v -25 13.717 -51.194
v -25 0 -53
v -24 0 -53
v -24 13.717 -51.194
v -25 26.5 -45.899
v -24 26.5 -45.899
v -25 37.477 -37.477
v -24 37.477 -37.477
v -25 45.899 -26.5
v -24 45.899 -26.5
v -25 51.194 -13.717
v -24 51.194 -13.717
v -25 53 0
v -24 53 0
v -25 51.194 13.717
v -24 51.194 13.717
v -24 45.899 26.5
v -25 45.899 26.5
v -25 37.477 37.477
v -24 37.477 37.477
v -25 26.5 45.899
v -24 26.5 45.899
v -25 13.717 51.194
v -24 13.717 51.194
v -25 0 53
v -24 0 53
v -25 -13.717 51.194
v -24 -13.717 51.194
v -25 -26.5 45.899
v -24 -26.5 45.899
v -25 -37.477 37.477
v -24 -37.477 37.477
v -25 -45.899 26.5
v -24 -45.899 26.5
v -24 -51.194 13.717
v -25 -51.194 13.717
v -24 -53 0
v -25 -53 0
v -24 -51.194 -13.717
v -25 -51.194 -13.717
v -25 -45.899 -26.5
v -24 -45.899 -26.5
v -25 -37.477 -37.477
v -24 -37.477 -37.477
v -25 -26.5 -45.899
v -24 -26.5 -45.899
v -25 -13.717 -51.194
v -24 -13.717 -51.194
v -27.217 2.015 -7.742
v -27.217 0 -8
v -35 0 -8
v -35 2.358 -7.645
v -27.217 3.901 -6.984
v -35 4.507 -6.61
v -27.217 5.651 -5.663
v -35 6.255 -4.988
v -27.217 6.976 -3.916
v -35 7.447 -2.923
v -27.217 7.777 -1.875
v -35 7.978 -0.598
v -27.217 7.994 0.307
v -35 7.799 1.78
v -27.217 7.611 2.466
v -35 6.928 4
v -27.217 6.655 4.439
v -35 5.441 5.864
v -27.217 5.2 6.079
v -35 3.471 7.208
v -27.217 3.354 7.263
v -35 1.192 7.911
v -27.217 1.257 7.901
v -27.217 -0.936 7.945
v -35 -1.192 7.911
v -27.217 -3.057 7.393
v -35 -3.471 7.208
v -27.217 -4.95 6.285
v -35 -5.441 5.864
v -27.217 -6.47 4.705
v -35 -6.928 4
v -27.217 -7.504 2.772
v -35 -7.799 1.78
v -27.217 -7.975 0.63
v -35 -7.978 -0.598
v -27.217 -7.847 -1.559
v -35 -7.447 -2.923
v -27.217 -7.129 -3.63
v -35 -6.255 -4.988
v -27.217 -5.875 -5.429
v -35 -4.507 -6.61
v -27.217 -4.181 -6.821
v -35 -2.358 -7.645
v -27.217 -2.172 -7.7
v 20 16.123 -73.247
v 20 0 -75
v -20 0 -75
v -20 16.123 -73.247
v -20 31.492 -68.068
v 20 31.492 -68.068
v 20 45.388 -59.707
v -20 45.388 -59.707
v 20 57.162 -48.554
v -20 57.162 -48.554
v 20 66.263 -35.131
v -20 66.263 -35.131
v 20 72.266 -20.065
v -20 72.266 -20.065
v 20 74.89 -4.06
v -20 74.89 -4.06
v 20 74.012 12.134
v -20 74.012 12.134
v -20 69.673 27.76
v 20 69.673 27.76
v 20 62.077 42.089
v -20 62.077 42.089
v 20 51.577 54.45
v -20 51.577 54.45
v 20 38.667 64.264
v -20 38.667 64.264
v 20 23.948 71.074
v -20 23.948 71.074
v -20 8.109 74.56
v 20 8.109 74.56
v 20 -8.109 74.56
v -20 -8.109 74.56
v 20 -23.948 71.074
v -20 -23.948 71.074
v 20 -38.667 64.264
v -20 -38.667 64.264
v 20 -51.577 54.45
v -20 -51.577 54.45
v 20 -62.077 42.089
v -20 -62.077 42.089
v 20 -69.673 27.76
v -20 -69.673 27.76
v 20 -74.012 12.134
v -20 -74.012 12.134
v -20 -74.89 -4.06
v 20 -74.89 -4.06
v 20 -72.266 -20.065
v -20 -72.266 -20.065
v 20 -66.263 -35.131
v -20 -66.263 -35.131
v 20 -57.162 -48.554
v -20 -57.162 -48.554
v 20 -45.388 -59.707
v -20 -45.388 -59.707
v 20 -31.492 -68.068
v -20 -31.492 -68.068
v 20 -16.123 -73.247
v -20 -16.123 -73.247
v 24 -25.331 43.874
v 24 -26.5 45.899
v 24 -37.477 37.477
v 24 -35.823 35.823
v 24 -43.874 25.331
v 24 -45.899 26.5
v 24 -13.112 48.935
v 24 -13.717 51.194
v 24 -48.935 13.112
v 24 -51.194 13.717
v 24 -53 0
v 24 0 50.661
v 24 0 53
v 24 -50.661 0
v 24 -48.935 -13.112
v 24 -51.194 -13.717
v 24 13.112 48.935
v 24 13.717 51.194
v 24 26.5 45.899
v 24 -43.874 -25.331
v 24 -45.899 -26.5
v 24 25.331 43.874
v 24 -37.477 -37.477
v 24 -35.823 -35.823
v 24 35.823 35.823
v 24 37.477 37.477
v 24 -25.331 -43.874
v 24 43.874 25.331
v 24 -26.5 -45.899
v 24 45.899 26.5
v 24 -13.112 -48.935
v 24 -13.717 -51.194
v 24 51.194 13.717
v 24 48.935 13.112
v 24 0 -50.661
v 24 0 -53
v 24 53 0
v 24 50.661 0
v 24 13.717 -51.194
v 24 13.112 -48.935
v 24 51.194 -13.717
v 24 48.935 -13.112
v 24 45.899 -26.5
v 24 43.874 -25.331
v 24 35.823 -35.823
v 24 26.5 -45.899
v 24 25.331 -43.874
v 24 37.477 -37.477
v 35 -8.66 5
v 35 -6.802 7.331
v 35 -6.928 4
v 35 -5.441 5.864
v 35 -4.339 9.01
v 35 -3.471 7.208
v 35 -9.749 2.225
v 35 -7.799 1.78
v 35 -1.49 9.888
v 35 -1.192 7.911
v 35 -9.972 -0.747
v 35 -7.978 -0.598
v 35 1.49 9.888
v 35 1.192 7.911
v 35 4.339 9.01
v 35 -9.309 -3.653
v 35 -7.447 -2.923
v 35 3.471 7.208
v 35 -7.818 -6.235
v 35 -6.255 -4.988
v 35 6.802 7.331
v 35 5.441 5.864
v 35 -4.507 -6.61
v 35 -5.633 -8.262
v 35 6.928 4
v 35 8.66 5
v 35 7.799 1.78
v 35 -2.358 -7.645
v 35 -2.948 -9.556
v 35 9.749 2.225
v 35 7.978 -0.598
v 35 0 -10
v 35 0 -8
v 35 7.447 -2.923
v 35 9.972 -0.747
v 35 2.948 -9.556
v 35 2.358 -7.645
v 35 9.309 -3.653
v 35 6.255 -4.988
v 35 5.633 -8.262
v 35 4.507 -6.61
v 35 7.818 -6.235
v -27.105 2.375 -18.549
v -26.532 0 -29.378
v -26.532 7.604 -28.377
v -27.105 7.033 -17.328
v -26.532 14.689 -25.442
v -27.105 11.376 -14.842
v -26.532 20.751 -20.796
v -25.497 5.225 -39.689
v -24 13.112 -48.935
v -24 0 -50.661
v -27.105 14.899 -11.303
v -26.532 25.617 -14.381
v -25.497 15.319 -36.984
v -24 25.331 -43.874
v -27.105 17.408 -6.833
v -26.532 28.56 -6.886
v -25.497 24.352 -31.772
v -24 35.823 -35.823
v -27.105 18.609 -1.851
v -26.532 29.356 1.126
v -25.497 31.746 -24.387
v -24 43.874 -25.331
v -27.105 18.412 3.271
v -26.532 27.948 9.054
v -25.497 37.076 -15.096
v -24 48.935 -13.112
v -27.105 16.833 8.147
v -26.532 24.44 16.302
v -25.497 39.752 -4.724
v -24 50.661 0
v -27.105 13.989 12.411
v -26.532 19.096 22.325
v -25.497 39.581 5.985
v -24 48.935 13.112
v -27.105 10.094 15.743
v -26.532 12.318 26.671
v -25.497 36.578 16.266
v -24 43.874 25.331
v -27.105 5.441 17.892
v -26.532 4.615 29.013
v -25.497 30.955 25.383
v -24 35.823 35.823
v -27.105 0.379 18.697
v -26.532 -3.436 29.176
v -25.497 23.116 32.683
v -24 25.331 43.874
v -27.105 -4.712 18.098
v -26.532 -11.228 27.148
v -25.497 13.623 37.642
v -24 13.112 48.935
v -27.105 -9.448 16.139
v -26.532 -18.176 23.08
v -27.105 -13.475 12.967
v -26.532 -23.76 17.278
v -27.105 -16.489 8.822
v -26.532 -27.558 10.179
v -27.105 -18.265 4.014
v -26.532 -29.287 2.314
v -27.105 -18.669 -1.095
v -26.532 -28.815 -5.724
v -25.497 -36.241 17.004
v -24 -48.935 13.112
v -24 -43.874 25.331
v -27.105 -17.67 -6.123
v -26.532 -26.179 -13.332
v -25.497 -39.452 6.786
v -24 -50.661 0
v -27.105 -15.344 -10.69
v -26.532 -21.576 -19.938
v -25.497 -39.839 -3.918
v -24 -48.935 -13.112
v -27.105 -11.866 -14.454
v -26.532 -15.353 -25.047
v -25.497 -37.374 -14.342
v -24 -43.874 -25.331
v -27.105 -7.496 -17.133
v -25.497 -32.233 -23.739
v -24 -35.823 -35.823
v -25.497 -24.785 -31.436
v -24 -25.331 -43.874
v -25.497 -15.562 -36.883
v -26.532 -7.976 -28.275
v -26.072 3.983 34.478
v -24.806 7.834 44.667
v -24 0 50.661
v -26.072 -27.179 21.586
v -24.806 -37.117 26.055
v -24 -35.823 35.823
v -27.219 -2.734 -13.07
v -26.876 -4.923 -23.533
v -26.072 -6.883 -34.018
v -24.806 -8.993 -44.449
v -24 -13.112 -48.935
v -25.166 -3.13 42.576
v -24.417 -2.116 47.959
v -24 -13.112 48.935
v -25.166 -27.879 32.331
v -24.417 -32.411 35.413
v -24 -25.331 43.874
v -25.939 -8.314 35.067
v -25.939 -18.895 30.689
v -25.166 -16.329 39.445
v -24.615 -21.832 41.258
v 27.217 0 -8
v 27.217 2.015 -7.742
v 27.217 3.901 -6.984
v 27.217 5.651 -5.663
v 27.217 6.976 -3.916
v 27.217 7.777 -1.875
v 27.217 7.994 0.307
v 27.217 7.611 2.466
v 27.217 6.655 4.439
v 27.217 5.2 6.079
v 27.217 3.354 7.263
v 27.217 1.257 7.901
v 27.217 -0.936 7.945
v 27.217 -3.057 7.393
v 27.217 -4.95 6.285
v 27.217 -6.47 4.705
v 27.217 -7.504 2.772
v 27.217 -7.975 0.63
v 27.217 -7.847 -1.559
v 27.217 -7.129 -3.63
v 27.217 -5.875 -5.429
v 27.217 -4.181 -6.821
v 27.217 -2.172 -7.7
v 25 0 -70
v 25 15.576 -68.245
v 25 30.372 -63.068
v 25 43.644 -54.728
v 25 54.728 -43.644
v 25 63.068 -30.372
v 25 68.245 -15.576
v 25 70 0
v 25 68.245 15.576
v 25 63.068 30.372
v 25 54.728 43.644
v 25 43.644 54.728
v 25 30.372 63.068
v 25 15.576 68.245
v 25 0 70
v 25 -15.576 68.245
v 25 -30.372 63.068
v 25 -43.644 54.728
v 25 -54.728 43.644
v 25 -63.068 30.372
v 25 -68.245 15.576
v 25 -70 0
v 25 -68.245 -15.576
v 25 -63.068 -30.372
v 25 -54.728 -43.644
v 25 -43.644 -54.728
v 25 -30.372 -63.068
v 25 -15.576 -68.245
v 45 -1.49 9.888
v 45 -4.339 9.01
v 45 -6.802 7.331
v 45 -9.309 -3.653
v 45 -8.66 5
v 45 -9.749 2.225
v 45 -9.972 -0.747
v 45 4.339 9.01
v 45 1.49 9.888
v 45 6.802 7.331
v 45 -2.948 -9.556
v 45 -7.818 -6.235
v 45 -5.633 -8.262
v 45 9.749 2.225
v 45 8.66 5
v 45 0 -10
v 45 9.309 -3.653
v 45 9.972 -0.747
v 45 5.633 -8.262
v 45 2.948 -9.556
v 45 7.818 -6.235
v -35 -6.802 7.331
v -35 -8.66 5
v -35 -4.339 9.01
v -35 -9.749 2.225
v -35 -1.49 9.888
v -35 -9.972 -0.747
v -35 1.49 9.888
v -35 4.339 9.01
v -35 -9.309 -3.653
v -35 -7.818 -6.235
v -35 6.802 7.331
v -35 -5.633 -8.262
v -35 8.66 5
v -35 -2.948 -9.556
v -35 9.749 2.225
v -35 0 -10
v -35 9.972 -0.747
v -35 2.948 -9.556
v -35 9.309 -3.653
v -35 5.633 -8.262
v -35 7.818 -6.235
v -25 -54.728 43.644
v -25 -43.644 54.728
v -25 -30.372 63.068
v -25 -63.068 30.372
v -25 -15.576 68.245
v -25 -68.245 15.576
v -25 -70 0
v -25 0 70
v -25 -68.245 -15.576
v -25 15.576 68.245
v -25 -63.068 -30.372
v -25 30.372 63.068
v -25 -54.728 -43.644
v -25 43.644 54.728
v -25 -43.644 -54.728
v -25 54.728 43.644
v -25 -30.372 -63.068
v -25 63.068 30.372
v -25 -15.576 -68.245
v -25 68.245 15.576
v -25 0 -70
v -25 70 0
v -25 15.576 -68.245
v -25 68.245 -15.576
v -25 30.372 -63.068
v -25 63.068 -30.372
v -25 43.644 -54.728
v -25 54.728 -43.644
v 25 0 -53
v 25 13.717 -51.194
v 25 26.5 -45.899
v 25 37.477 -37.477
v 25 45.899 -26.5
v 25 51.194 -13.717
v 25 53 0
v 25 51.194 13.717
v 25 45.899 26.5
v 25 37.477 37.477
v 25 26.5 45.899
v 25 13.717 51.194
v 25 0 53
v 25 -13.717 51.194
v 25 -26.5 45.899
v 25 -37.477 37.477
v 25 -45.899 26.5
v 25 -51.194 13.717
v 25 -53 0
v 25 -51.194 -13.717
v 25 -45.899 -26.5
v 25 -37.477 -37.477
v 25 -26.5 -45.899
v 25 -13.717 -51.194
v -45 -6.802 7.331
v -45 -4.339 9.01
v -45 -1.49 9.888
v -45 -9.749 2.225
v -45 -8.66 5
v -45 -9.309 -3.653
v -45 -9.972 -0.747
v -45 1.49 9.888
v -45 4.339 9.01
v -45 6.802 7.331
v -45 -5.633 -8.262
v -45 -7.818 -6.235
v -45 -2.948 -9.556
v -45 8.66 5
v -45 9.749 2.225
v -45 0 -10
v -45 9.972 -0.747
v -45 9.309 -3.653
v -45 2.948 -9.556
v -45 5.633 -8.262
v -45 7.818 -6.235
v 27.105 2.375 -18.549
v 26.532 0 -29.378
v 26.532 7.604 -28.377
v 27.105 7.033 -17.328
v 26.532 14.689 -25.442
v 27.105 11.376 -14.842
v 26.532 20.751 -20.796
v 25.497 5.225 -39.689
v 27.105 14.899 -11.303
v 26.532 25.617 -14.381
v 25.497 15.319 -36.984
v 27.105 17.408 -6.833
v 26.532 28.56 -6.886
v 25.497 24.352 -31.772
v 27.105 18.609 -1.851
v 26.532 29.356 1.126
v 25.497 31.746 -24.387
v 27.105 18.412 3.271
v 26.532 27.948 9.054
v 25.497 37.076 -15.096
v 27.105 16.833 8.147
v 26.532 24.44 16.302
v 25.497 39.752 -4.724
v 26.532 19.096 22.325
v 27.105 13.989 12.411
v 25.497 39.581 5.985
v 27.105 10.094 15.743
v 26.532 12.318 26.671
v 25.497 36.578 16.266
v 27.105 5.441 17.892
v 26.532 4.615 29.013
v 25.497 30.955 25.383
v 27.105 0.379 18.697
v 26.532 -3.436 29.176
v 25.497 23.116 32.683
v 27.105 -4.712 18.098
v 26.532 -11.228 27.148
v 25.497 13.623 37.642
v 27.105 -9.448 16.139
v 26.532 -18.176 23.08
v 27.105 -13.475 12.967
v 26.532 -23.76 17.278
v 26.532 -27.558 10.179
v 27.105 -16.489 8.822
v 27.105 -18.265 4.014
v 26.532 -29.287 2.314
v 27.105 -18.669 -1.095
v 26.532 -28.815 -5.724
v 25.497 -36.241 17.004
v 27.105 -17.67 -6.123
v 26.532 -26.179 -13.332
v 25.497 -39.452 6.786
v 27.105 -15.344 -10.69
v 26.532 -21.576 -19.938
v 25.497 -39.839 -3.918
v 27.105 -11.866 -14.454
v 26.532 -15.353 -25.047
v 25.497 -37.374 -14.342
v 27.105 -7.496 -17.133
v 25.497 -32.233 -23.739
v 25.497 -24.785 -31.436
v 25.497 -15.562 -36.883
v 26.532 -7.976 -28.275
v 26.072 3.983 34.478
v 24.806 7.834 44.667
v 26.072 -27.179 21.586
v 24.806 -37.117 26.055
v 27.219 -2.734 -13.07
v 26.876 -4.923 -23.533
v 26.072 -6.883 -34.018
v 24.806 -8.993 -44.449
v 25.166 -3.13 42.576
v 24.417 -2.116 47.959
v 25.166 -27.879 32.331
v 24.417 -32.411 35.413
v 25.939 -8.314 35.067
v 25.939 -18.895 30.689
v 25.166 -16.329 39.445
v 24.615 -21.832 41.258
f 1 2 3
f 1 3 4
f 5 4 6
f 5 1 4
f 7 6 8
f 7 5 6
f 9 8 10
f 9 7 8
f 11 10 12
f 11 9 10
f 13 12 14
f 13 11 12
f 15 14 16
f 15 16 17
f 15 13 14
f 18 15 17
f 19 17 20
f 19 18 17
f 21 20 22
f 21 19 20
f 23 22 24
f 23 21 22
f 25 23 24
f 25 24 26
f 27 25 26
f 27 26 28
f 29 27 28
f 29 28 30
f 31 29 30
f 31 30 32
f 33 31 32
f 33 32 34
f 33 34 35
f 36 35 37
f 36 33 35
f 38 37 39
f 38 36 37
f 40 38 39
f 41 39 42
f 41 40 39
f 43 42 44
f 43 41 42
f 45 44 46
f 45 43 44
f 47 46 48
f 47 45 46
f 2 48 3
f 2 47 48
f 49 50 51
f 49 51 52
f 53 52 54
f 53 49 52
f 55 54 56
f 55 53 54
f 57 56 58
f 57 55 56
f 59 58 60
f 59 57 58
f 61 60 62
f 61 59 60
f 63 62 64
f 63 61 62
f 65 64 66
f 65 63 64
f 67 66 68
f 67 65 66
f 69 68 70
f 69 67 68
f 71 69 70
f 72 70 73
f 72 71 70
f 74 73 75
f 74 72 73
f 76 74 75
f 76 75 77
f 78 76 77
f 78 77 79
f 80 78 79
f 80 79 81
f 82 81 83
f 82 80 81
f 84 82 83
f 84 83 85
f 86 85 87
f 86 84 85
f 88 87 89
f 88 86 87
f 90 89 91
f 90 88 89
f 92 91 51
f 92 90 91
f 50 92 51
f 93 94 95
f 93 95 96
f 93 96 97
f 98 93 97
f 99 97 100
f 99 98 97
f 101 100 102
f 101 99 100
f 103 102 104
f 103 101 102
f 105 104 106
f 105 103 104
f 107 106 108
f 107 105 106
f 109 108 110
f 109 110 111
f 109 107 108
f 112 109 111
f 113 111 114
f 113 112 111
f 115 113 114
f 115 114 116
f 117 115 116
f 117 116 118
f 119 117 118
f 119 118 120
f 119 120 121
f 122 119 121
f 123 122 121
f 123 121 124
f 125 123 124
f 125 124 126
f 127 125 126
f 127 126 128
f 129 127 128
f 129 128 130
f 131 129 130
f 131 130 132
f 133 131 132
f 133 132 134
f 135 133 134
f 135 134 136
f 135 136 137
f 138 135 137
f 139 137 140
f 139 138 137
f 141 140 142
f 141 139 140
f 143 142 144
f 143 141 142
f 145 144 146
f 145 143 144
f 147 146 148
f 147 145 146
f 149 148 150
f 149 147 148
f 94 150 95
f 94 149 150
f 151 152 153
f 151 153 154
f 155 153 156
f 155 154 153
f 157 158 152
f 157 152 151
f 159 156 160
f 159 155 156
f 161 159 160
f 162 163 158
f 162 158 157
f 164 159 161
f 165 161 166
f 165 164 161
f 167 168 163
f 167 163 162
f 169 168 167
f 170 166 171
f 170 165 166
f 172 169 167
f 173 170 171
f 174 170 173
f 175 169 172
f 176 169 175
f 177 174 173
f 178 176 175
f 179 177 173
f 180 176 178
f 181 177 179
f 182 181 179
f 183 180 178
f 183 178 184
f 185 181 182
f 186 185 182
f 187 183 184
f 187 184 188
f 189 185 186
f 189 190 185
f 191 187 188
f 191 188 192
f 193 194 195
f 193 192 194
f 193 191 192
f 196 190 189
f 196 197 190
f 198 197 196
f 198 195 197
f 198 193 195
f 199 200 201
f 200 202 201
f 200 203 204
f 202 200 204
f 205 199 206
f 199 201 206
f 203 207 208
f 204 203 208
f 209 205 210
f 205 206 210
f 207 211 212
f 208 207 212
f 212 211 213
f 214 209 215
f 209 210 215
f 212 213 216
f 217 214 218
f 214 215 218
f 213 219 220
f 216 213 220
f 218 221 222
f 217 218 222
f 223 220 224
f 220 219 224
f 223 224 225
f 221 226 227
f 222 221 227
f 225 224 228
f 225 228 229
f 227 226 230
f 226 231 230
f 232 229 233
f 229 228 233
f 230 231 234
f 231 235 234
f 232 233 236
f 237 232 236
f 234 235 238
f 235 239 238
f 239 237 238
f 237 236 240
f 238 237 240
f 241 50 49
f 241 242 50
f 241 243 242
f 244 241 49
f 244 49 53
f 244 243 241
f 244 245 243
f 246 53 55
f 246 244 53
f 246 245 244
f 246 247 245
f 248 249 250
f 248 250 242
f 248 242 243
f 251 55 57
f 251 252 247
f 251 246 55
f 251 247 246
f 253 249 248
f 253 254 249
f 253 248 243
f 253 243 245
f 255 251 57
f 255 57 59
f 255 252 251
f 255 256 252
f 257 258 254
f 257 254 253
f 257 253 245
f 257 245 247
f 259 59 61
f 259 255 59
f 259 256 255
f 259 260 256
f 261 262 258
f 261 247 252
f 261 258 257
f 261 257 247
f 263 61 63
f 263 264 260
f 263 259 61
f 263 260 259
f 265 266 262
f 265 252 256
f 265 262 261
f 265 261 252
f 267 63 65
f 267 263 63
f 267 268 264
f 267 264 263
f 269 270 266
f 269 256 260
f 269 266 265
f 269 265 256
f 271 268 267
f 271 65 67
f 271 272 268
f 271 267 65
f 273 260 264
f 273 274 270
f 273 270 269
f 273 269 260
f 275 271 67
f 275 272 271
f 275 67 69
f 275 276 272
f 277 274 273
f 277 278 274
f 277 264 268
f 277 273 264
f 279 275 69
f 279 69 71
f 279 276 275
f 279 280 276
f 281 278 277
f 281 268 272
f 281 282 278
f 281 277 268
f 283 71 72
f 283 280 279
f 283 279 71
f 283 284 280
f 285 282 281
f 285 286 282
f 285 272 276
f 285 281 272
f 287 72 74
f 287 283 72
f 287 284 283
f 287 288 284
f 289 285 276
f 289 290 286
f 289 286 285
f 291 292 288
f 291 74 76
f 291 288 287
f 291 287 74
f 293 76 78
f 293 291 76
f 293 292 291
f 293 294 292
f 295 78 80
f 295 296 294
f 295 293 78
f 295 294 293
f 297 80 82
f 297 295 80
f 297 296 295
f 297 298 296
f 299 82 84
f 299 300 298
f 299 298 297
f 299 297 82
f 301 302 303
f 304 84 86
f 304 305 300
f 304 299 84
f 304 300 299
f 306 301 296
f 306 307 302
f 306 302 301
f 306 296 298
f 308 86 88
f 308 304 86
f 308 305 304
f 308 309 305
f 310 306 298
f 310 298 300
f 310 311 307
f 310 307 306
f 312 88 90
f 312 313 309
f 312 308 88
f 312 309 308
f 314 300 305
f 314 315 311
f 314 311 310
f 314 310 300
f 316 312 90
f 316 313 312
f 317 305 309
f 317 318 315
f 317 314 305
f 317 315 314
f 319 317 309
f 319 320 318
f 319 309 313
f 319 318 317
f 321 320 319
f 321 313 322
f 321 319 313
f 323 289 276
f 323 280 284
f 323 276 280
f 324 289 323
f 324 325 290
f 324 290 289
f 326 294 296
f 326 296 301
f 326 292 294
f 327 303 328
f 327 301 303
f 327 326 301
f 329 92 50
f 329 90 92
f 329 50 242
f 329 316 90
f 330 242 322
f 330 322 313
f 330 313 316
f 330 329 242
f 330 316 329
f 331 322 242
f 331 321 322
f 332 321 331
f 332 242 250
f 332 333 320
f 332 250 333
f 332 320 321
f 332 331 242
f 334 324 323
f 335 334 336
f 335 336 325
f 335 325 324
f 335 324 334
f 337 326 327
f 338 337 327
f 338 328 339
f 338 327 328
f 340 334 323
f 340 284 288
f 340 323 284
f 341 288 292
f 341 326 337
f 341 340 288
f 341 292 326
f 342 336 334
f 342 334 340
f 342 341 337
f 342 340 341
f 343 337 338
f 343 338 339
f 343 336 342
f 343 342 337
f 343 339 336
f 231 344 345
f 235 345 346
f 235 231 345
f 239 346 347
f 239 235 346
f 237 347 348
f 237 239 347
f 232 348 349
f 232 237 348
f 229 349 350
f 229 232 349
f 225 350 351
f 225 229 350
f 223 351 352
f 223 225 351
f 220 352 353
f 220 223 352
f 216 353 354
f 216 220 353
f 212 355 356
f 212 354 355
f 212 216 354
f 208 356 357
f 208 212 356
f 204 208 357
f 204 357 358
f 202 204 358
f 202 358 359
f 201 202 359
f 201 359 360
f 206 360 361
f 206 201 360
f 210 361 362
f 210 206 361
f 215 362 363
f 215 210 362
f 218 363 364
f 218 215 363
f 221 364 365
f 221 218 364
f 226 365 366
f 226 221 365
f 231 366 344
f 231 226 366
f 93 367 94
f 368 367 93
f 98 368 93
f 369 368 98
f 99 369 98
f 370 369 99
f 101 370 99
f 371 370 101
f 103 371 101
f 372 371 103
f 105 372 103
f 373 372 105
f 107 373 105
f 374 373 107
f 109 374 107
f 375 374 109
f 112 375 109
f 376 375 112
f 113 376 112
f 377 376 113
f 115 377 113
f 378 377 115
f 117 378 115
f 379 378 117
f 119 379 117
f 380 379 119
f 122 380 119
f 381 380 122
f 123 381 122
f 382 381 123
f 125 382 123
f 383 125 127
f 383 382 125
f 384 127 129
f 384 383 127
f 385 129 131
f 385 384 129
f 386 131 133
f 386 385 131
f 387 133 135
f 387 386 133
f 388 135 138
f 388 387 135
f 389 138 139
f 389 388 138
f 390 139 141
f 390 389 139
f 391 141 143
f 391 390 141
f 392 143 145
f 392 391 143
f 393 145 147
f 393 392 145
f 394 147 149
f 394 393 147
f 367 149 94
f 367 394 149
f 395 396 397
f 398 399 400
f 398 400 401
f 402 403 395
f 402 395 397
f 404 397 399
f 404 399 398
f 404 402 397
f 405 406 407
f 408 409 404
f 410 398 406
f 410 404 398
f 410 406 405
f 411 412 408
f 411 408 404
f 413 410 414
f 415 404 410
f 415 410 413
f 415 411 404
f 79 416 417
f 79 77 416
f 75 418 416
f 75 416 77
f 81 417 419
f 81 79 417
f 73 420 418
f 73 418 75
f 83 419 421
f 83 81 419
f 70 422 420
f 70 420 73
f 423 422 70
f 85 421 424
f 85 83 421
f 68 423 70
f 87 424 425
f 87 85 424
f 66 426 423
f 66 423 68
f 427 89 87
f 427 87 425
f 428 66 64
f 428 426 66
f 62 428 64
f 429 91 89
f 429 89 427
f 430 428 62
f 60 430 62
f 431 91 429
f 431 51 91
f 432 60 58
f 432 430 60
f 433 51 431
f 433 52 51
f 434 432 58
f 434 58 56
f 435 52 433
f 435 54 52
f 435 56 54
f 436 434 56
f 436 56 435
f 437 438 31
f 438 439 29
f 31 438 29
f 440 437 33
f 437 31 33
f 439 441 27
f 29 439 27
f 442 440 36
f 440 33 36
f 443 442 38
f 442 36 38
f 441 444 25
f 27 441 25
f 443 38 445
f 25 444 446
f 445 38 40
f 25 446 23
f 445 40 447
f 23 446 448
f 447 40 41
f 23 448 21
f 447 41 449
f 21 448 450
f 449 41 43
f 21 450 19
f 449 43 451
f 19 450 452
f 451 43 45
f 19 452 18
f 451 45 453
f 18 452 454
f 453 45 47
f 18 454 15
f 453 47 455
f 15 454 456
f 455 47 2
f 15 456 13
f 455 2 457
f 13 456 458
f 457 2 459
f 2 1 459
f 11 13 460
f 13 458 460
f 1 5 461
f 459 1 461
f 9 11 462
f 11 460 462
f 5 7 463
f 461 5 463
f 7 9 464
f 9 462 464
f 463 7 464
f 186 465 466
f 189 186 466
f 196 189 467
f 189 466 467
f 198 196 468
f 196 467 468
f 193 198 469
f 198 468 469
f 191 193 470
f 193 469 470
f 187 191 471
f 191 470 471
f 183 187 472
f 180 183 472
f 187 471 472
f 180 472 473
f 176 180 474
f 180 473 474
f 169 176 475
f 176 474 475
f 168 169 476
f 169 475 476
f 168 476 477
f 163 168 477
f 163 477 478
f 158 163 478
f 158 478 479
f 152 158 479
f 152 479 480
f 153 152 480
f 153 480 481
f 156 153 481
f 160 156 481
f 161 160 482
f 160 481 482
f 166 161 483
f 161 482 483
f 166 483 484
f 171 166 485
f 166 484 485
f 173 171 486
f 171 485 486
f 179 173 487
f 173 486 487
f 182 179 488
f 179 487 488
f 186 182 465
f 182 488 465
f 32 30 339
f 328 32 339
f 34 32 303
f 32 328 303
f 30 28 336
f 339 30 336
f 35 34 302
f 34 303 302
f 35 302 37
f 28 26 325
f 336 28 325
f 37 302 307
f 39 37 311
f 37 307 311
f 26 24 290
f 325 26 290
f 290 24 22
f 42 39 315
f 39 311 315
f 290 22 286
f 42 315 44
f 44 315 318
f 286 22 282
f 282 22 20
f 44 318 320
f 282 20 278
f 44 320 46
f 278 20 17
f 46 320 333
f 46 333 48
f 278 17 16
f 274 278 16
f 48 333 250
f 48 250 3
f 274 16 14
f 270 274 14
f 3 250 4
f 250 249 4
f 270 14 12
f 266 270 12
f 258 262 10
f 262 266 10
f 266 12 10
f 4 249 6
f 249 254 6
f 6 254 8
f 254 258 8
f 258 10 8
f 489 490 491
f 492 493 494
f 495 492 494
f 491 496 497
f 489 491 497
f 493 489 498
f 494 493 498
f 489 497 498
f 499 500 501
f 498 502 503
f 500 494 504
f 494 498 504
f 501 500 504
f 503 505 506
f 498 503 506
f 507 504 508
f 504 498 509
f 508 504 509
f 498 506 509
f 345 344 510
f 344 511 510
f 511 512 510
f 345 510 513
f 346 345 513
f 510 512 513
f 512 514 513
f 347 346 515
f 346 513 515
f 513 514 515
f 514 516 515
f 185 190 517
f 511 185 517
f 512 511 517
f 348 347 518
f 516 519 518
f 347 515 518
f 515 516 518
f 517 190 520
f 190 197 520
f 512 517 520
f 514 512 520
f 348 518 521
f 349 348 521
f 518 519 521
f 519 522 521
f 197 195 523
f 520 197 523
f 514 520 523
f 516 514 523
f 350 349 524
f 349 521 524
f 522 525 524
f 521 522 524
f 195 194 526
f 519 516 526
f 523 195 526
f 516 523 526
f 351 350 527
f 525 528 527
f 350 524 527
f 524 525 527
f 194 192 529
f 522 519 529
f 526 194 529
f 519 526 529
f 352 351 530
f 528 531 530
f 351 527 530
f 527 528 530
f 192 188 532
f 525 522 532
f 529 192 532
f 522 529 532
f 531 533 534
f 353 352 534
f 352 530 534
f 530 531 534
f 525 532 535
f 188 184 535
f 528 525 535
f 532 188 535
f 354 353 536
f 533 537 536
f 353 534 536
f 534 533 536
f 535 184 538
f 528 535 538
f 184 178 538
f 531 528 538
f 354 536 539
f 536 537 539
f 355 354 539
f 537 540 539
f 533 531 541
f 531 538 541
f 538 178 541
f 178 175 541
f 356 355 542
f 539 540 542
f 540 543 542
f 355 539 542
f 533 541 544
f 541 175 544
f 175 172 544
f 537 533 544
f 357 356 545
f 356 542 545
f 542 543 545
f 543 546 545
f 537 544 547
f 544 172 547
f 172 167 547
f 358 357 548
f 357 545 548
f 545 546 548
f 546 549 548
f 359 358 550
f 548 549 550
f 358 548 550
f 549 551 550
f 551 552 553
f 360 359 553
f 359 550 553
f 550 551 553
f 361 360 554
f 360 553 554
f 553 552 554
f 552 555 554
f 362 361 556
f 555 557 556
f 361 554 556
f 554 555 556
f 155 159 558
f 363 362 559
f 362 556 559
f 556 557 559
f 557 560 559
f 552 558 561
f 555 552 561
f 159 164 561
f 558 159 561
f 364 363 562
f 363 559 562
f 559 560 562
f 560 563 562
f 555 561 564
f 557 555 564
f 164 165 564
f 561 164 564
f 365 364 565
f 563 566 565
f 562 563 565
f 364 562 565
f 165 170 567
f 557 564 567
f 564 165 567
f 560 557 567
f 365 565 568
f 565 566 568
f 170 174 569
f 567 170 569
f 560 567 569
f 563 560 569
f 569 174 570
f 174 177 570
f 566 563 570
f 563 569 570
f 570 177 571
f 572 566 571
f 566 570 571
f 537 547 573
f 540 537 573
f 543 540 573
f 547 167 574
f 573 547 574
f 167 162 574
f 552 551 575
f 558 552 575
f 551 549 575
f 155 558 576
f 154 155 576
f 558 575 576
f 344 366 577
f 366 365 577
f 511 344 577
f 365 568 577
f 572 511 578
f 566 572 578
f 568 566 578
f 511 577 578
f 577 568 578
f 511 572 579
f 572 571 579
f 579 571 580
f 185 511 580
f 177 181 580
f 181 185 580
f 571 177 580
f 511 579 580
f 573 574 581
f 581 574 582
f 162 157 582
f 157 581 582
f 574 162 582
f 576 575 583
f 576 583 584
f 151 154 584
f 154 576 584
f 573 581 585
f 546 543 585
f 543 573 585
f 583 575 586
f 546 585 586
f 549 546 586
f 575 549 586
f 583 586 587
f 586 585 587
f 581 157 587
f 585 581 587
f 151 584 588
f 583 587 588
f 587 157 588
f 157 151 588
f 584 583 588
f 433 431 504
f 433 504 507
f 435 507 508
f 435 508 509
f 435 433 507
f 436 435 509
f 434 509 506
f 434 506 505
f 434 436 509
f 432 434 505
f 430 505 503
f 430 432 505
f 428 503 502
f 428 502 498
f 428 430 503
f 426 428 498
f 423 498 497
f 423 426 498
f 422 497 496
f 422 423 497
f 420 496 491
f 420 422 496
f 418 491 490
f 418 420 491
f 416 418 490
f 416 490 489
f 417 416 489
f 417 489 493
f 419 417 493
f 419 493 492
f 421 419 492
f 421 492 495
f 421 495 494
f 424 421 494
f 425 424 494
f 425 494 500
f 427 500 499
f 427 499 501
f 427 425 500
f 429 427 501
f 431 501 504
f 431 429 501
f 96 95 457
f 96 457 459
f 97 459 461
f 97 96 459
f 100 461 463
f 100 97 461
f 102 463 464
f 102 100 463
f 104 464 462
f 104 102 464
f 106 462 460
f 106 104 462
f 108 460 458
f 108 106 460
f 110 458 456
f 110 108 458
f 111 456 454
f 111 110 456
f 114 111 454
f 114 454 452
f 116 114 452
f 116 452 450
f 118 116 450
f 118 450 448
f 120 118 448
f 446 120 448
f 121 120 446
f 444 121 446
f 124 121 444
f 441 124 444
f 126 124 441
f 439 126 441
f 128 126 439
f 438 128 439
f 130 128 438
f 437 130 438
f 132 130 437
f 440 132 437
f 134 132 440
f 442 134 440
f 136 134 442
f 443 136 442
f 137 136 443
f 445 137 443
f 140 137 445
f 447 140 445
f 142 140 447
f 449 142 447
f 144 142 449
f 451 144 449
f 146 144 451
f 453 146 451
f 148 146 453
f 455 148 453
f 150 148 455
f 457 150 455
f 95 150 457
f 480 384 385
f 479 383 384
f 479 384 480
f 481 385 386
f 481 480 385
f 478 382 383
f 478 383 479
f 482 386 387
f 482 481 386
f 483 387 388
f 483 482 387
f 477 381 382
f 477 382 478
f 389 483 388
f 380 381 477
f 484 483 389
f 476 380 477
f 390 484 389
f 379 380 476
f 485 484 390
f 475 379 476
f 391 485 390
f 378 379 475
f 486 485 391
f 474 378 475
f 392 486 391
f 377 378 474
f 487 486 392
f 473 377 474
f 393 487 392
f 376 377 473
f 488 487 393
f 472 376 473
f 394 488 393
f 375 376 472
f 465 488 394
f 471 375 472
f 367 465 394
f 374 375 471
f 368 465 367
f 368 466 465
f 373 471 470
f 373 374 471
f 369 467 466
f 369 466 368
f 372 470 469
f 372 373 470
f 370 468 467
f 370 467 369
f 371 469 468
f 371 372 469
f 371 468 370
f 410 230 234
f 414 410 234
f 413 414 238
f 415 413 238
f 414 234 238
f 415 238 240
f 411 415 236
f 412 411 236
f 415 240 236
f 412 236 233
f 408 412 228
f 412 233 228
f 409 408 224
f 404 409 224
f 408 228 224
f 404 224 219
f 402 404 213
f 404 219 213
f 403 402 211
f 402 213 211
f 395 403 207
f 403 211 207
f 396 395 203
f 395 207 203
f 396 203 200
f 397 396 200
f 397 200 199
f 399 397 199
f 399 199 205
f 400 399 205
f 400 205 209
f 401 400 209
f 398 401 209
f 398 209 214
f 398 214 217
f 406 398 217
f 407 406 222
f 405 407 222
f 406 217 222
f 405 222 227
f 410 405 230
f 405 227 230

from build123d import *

# Parameters (mm, degrees)
SKETCH1_R           = 75
BOSS_EXTRUDE1_DEPTH = 25
SKETCH2_R           = 8
BOSS_EXTRUDE2_DEPTH = 35
SKETCH3_R           = 10
BOSS_EXTRUDE3_DEPTH = 10
CHAMFER1_SIZE       = 5
SKETCH4_R           = 53
SKETCH4_R_2         = 8
CUT_EXTRUDE1_DEPTH  = 1


with BuildPart() as part:
    # Sketch1 → Boss-Extrude1 (new body, symmetric)
    with BuildSketch(Plane(origin=(0, 0, 0), x_dir=(0, 0, -1), z_dir=(1, 0, 0))):
        Circle(SKETCH1_R)
    extrude(amount=BOSS_EXTRUDE1_DEPTH, both=True)

    # Sketch2 → Boss-Extrude2 (add, symmetric)
    with BuildSketch(Plane(origin=(0, 0, 0), x_dir=(0, 0, -1), z_dir=(1, 0, 0))):
        Circle(SKETCH2_R)
    extrude(amount=BOSS_EXTRUDE2_DEPTH, both=True)

    # Sketch3 → Boss-Extrude3 (add)
    with BuildSketch(Plane(origin=(35, 0, 0), x_dir=(0, 0, -1), z_dir=(1, 0, 0))):
        Circle(SKETCH3_R)
    boss_extrude3 = extrude(amount=BOSS_EXTRUDE3_DEPTH)

    # Mirror1: Boss-Extrude3 across plane
    add(boss_extrude3.mirror(Plane(origin=(0, 0, 0), x_dir=(0, 0, 1), z_dir=(1, 0, 0))))

    # Chamfer1
    chamfer1_edges = [part.edges().sort_by_distance(p)[0] for p in [
        (-25, 0, 75),
        (25, 0, 75),
    ]]
    chamfer(chamfer1_edges, length=CHAMFER1_SIZE)

    # Sketch4 → Cut-Extrude1 (cut)
    with BuildSketch(Plane(origin=(25, 0, 0), x_dir=(0, 0, -1), z_dir=(1, 0, 0))):
        Circle(SKETCH4_R)
        Circle(SKETCH4_R_2, mode=Mode.SUBTRACT)
    cut_extrude1 = extrude(amount=-CUT_EXTRUDE1_DEPTH, mode=Mode.SUBTRACT)

    # Mirror2: Cut-Extrude1 across plane
    add(cut_extrude1.mirror(Plane(origin=(0, 0, 0), x_dir=(0, 0, 1), z_dir=(1, 0, 0))), mode=Mode.SUBTRACT)

    # Sketch5 → Revolve1 (revolve)
    with BuildSketch(Plane(origin=(0, 0, 0), x_dir=(1, 0, 0), z_dir=(0, 1, 0))):
        with BuildLine():
            Line((24, 0), (24, 50.661166178))
            add(Edge.make_bspline(
                [(27, 0), (28.099596194, 25.463923128), (24, 50.661166178)],
                knots=[0, 0, 0, 1, 1, 1], degree=2))
            Line((27, 0), (24, 0))
        make_face()
    revolve1 = revolve(axis=Axis((27, 0, 0), (1, 0, 0)))

    # Mirror3: Revolve1 across plane
    add(revolve1.mirror(Plane(origin=(0, 0, 0), x_dir=(0, 0, 1), z_dir=(1, 0, 0))))


solid = part.part
